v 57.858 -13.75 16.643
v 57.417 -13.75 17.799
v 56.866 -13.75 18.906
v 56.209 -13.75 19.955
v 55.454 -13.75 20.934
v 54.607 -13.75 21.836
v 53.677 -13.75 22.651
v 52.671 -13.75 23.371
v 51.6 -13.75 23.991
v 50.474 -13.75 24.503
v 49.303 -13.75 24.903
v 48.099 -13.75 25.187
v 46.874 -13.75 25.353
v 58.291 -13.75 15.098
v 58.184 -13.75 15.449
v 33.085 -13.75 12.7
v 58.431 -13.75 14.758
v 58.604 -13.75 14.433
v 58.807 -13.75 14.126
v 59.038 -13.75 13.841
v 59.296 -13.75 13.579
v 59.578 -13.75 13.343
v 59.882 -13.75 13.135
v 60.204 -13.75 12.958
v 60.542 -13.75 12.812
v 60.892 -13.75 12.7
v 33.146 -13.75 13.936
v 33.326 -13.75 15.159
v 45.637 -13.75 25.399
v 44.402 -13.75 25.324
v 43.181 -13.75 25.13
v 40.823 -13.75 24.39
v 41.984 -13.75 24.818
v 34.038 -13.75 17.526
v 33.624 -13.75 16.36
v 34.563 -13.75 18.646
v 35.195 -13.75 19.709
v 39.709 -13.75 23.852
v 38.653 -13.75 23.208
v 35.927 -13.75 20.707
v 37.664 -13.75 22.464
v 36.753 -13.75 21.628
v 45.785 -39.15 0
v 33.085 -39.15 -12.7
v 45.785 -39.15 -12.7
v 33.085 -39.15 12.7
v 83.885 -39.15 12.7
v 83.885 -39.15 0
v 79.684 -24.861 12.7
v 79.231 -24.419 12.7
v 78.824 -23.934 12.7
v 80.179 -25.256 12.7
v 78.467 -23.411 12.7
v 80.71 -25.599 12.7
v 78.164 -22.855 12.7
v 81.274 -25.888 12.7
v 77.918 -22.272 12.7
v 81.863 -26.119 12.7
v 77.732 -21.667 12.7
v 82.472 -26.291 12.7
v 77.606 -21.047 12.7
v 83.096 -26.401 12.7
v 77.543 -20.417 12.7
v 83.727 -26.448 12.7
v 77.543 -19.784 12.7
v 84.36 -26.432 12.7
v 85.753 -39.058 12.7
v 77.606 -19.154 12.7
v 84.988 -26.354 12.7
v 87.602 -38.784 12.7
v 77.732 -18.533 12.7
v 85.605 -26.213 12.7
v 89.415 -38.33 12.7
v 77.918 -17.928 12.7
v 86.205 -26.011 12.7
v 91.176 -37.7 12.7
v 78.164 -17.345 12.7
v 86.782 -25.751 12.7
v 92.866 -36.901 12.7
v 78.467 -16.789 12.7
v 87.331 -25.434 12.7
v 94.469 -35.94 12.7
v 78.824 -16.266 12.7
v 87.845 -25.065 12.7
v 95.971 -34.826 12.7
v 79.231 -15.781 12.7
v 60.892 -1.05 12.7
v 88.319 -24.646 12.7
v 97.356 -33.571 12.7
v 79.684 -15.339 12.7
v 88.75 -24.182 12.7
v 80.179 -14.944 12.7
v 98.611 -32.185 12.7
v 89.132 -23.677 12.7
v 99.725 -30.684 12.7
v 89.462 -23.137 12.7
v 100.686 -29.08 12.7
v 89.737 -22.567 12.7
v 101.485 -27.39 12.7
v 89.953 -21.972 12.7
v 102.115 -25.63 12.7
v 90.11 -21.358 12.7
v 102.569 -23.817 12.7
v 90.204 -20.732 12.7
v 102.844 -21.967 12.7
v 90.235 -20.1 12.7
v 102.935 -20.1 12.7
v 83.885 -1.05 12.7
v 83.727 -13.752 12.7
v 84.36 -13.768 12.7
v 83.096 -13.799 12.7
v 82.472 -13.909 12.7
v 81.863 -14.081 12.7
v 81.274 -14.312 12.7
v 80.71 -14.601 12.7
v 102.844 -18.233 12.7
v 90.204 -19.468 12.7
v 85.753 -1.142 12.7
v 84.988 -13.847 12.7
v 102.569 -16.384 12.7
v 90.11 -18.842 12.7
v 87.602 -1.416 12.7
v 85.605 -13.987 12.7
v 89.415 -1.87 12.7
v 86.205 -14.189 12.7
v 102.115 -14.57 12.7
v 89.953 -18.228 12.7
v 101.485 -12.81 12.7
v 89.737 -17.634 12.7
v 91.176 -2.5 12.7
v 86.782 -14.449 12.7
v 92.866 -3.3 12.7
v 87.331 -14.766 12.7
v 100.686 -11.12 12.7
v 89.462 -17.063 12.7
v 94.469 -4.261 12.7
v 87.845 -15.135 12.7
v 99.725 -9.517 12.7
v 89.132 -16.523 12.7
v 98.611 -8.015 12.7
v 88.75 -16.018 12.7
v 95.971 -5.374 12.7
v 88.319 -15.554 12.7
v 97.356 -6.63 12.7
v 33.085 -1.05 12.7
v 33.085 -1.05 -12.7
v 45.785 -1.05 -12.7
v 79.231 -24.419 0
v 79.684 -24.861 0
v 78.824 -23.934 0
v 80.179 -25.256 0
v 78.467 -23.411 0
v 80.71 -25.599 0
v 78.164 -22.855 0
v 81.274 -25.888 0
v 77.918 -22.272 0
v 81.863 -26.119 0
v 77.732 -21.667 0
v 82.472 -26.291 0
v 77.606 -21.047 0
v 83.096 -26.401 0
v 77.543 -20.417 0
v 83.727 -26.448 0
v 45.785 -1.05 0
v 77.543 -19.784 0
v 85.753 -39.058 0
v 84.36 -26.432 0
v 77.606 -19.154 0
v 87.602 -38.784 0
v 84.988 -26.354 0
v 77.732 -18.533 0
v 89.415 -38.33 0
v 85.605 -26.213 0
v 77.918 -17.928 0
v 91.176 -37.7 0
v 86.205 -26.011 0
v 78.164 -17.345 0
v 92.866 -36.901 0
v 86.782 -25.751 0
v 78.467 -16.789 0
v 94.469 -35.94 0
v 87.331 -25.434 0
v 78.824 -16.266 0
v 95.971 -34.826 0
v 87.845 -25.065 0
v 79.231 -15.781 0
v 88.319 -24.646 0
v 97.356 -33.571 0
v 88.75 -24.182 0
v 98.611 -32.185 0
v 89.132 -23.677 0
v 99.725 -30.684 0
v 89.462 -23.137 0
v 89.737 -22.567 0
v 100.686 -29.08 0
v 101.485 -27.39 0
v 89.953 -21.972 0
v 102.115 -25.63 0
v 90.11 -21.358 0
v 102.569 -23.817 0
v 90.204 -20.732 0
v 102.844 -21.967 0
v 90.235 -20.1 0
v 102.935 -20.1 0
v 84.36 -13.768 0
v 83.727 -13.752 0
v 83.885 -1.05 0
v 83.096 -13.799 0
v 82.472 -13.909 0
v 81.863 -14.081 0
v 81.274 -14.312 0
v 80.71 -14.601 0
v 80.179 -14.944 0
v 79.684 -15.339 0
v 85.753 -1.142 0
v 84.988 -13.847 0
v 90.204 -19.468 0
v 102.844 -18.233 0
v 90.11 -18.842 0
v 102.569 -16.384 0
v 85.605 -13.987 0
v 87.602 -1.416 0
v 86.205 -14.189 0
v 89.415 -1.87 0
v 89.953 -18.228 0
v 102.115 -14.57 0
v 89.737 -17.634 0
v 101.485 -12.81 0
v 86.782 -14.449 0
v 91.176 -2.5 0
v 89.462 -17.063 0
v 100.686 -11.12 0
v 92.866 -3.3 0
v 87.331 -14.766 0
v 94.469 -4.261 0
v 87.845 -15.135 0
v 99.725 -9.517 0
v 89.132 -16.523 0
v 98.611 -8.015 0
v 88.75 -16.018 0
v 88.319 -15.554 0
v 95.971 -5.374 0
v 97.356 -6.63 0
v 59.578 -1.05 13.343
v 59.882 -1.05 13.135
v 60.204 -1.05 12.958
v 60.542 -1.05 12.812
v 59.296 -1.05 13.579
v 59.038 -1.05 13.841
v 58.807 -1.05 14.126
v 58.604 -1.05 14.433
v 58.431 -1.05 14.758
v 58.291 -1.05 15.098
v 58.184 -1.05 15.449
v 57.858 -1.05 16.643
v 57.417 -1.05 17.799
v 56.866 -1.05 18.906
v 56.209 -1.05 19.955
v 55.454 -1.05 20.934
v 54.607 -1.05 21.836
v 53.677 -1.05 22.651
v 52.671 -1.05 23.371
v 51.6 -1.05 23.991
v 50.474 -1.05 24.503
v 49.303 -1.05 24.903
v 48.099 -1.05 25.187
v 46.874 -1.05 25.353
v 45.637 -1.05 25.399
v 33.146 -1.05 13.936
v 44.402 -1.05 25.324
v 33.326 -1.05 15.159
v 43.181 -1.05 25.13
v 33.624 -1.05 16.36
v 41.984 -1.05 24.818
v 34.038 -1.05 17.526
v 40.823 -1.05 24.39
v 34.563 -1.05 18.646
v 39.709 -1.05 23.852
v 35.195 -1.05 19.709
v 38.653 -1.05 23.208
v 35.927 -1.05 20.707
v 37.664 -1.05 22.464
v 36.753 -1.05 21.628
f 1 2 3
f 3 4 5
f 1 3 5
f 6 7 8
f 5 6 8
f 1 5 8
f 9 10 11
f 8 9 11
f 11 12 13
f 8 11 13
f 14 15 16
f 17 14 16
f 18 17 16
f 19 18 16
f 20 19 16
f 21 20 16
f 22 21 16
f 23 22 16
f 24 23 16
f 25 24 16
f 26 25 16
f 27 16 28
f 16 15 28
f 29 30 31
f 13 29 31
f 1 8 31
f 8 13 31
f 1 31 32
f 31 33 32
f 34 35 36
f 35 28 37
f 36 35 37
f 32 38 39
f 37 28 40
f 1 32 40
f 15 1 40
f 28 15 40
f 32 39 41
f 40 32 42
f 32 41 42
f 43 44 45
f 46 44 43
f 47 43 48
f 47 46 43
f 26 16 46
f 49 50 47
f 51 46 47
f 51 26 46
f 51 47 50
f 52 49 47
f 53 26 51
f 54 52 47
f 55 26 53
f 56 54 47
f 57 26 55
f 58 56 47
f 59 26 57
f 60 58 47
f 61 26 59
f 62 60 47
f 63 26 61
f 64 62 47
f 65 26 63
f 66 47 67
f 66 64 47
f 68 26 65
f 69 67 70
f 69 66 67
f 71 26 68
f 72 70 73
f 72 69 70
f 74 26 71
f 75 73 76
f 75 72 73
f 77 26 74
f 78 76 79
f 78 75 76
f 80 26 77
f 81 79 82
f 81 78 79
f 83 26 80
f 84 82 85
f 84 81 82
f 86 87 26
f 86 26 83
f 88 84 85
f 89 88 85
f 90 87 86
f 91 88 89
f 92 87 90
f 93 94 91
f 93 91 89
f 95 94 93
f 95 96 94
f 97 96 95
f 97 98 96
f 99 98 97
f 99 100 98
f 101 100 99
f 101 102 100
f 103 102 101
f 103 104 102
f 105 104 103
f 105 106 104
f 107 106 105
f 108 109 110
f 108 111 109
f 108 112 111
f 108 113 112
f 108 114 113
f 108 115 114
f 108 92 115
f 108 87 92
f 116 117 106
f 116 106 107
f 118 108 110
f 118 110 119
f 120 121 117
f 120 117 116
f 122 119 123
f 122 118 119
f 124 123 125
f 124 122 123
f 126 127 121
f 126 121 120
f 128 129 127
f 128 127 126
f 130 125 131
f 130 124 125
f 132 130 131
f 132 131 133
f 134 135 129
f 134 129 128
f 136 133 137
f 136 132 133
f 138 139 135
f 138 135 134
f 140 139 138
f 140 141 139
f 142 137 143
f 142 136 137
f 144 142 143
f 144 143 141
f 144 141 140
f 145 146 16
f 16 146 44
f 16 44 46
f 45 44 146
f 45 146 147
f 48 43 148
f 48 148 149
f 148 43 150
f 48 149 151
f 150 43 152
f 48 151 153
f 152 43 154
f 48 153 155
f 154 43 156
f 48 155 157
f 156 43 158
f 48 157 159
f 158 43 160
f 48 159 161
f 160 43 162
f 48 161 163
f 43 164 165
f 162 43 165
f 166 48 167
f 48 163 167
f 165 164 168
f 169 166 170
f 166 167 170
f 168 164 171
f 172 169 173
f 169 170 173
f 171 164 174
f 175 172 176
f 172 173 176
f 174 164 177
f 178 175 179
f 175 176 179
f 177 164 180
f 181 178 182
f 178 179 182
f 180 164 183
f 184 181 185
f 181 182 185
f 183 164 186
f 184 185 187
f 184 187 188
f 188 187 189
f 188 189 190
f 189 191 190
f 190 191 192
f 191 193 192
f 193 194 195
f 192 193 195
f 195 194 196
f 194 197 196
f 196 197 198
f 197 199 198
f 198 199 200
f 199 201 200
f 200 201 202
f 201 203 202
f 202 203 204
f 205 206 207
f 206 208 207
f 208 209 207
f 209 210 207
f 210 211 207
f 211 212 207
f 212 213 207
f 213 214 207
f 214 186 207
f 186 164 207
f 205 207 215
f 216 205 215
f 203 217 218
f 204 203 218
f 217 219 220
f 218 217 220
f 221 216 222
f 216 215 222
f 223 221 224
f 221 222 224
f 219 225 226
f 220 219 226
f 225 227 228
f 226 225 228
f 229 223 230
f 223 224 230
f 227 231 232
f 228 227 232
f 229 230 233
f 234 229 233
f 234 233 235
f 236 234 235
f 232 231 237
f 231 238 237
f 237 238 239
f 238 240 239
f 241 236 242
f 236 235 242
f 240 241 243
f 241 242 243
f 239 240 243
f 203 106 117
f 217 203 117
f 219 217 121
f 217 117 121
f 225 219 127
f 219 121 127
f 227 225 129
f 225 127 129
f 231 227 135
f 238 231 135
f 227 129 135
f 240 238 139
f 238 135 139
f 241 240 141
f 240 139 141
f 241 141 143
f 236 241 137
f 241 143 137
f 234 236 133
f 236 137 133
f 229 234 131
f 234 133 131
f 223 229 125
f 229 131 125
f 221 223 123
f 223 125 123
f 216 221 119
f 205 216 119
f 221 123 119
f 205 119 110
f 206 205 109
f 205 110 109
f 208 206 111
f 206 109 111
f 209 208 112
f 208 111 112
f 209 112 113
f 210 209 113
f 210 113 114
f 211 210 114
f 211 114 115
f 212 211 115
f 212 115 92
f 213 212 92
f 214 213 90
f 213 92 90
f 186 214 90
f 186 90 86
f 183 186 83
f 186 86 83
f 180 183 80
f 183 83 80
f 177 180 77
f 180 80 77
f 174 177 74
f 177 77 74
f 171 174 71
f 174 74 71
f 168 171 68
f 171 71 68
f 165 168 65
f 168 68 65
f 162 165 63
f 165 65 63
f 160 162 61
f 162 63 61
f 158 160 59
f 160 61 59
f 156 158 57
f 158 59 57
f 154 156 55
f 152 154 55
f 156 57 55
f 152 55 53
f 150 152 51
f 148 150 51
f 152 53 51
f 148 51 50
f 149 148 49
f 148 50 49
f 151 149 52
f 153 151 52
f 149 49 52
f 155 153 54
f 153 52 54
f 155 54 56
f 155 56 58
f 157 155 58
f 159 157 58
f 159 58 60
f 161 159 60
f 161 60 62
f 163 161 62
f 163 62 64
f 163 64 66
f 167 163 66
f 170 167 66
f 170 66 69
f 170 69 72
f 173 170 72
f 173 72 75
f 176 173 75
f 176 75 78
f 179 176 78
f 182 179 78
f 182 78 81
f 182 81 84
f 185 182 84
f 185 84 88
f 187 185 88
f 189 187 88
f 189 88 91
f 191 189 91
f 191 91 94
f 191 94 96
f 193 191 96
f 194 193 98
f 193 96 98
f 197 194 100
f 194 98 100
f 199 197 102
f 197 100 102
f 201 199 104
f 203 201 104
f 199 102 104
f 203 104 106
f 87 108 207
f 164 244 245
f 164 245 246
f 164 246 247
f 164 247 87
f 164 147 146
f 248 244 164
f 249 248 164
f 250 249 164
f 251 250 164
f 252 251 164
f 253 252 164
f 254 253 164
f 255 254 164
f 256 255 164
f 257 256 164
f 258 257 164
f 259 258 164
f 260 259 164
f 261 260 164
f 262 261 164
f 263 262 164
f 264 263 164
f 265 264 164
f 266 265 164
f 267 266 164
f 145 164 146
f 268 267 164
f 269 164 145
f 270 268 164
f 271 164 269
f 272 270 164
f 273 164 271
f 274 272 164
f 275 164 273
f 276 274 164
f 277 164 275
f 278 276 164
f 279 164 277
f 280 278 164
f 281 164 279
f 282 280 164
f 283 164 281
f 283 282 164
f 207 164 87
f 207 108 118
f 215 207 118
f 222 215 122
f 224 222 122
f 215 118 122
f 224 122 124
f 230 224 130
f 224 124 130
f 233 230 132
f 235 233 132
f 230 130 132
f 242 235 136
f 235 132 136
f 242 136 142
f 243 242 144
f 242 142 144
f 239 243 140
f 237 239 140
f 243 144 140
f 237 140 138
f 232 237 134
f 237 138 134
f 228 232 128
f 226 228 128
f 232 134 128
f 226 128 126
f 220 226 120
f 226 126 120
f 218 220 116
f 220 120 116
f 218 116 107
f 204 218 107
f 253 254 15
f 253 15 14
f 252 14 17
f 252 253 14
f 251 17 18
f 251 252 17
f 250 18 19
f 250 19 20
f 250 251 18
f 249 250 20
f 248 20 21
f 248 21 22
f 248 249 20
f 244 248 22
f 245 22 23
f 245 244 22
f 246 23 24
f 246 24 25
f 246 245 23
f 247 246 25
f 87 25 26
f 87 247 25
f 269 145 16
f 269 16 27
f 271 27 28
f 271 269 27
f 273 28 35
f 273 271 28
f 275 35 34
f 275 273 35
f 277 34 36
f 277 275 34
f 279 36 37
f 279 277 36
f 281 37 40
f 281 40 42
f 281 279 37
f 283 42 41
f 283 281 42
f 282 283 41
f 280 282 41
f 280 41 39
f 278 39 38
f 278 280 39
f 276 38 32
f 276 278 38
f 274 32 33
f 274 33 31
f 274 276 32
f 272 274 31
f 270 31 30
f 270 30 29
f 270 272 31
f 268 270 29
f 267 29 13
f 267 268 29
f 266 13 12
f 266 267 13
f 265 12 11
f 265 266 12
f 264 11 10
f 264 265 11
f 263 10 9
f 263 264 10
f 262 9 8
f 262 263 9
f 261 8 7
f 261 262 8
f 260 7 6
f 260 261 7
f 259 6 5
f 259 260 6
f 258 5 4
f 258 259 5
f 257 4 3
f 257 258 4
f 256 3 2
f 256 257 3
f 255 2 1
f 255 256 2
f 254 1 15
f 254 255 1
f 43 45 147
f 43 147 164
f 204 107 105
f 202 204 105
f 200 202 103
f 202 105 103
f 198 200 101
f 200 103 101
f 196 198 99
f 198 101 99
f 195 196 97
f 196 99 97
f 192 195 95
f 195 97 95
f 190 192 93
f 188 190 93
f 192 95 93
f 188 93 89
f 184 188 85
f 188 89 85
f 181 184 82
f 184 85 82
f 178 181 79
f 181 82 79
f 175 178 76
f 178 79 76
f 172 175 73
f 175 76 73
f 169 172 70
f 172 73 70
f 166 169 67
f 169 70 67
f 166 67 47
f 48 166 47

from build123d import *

# Parameters (mm, degrees)
F0_W     = 69.85
F0_H     = 38.1
F1_DEPTH = 12.7
F2_W     = 12.7
F2_H     = 12.7
F3_DEPTH = 38.1
F5_DEPTH = 12.7
F6_R     = 6.35
F7_DEPTH = 12.7
F9_DEPTH = 12.7


with BuildPart() as f1:
    # F0 (on Top) → F1 (new body)
    with BuildSketch(Plane.XY):
        with Locations((68.010411, -20.100126)):
            Rectangle(F0_W, F0_H)
    extrude(amount=F1_DEPTH)

    # F2 (on face) → F3 (join)
    with BuildSketch(Plane.XZ.offset(39.150126)):
        with Locations((39.435411, -6.35)):
            Rectangle(F2_W, F2_H)
    extrude(amount=-F3_DEPTH)

    # F4 (on face) → F5 (cut)
    with BuildSketch(Plane.XY.offset(12.7)):
        with BuildLine():
            ThreePointArc((83.885411, -1.050126), (97.355795, -6.629742), (102.935411, -20.100126))
            Line((102.935411, -20.100126), (102.935411, -1.050126))
            Line((102.935411, -1.050126), (83.885411, -1.050126))
        make_face()
        with BuildLine():
            Line((102.935411, -39.150126), (102.935411, -20.100126))
            ThreePointArc((102.935411, -20.100126), (97.355795, -33.57051), (83.885411, -39.150126))
            Line((83.885411, -39.150126), (102.935411, -39.150126))
        make_face()
    extrude(amount=-F5_DEPTH, mode=Mode.SUBTRACT)

    # F6 (on face) → F7 (cut)
    with BuildSketch(Plane.XY.offset(12.7)):
        with Locations((83.885411, -20.100126)):
            Circle(F6_R)
    extrude(amount=-F7_DEPTH, mode=Mode.SUBTRACT)

    # F8 (on face) → F9 (join)
    with BuildSketch(Plane(origin=(0, -1.050126, 0), x_dir=(-1, 0, 0), z_dir=(0, 1, 0))):
        with BuildLine():
            ThreePointArc((-58.485411, 12.7), (-58.409892, 14.082925), (-58.184233, 15.449404))
            ThreePointArc((-58.184233, 15.449404), (-59.164143, 13.706609), (-60.891655, 12.7))
            Line((-60.891655, 12.7), (-58.485411, 12.7))
        make_face()
        with BuildLine():
            Line((-58.485411, 12.7), (-33.085411, 12.7))
            ThreePointArc((-33.085411, 12.7), (-44.402486, 25.324481), (-58.184233, 15.449404))
            ThreePointArc((-58.184233, 15.449404), (-58.409892, 14.082925), (-58.485411, 12.7))
        make_face()
    extrude(amount=-F9_DEPTH)


solid = f1.part
